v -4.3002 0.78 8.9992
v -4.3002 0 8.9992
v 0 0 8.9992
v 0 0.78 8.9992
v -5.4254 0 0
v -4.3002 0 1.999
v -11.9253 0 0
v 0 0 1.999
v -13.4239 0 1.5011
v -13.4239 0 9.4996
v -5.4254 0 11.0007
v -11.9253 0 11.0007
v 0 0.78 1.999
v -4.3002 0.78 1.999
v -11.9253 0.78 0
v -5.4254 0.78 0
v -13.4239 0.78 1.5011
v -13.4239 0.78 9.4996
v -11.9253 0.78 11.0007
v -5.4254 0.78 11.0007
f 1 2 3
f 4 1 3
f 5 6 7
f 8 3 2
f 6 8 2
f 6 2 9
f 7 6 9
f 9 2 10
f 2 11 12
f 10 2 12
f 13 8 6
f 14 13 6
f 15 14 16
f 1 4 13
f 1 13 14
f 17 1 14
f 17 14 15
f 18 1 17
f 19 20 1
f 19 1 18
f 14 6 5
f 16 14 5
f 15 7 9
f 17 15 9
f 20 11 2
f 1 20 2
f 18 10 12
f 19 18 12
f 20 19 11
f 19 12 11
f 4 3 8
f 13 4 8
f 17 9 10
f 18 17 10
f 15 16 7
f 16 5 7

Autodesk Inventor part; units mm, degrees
ref_plane "YZ Plane" through (0, 0, 0) normal (1, 0, 0) x (0, 1, 0)
ref_plane "XZ Plane" through (0, 0, 0) normal (0, 1, 0) x (-1, 0, 0)
ref_plane "XY Plane" through (0, 0, 0) normal (0, 0, 1) x (1, 0, 0)
sketch "Sketch1" plane through (0, 0, 0) normal (0, 1, 0) x (-1, 0, 0)
  line L0 (4.3002, 1.999) -> (5.4254, 0)
  line L1 (5.4254, 0) -> (11.9253, 0)
  line L2 (11.9253, 0) -> (13.4239, 1.5011)
  line L3 (13.4239, 1.5011) -> (13.4239, 9.4996)
  line L4 (13.4239, 9.4996) -> (11.9253, 11.0007)
  line L5 (11.9253, 11.0007) -> (5.4254, 11.0007)
  line L6 (5.4254, 11.0007) -> (4.3002, 8.9992)
  line L7 (4.3002, 8.9992) -> (0, 8.9992)
  line L8 (0, 8.9992) -> (0, 1.999)
  line L9 (0, 1.999) -> (4.3002, 1.999)
  line L10 (0, 8.9992) -> (4.3002, 8.9992)
  line L11 (4.3002, 8.9992) -> (5.4254, 11.0007)
  line L12 (5.4254, 11.0007) -> (11.9253, 11.0007)
  line L13 (11.9253, 11.0007) -> (13.4239, 9.4996)
  line L14 (13.4239, 9.4996) -> (13.4239, 1.5011)
  line L15 (13.4239, 1.5011) -> (11.9253, 0)
  line L16 (11.9253, 0) -> (5.4254, 0)
  line L17 (5.4254, 0) -> (4.3002, 1.999)
  line L18 (4.3002, 1.999) -> (0, 1.999)
  line L19 (0, 1.999) -> (0, 8.9992)
  point P0 (0, 0)
extrude "Extrusion1" add sketch "Sketch1" along normal blind 0.78
ref_plane "Work Plane1" through (-11.9253, 0, 5.5004) normal (0, 0, 1) x (1, 0, 0)
properties part number "32ch_ACF2TDT_board"
